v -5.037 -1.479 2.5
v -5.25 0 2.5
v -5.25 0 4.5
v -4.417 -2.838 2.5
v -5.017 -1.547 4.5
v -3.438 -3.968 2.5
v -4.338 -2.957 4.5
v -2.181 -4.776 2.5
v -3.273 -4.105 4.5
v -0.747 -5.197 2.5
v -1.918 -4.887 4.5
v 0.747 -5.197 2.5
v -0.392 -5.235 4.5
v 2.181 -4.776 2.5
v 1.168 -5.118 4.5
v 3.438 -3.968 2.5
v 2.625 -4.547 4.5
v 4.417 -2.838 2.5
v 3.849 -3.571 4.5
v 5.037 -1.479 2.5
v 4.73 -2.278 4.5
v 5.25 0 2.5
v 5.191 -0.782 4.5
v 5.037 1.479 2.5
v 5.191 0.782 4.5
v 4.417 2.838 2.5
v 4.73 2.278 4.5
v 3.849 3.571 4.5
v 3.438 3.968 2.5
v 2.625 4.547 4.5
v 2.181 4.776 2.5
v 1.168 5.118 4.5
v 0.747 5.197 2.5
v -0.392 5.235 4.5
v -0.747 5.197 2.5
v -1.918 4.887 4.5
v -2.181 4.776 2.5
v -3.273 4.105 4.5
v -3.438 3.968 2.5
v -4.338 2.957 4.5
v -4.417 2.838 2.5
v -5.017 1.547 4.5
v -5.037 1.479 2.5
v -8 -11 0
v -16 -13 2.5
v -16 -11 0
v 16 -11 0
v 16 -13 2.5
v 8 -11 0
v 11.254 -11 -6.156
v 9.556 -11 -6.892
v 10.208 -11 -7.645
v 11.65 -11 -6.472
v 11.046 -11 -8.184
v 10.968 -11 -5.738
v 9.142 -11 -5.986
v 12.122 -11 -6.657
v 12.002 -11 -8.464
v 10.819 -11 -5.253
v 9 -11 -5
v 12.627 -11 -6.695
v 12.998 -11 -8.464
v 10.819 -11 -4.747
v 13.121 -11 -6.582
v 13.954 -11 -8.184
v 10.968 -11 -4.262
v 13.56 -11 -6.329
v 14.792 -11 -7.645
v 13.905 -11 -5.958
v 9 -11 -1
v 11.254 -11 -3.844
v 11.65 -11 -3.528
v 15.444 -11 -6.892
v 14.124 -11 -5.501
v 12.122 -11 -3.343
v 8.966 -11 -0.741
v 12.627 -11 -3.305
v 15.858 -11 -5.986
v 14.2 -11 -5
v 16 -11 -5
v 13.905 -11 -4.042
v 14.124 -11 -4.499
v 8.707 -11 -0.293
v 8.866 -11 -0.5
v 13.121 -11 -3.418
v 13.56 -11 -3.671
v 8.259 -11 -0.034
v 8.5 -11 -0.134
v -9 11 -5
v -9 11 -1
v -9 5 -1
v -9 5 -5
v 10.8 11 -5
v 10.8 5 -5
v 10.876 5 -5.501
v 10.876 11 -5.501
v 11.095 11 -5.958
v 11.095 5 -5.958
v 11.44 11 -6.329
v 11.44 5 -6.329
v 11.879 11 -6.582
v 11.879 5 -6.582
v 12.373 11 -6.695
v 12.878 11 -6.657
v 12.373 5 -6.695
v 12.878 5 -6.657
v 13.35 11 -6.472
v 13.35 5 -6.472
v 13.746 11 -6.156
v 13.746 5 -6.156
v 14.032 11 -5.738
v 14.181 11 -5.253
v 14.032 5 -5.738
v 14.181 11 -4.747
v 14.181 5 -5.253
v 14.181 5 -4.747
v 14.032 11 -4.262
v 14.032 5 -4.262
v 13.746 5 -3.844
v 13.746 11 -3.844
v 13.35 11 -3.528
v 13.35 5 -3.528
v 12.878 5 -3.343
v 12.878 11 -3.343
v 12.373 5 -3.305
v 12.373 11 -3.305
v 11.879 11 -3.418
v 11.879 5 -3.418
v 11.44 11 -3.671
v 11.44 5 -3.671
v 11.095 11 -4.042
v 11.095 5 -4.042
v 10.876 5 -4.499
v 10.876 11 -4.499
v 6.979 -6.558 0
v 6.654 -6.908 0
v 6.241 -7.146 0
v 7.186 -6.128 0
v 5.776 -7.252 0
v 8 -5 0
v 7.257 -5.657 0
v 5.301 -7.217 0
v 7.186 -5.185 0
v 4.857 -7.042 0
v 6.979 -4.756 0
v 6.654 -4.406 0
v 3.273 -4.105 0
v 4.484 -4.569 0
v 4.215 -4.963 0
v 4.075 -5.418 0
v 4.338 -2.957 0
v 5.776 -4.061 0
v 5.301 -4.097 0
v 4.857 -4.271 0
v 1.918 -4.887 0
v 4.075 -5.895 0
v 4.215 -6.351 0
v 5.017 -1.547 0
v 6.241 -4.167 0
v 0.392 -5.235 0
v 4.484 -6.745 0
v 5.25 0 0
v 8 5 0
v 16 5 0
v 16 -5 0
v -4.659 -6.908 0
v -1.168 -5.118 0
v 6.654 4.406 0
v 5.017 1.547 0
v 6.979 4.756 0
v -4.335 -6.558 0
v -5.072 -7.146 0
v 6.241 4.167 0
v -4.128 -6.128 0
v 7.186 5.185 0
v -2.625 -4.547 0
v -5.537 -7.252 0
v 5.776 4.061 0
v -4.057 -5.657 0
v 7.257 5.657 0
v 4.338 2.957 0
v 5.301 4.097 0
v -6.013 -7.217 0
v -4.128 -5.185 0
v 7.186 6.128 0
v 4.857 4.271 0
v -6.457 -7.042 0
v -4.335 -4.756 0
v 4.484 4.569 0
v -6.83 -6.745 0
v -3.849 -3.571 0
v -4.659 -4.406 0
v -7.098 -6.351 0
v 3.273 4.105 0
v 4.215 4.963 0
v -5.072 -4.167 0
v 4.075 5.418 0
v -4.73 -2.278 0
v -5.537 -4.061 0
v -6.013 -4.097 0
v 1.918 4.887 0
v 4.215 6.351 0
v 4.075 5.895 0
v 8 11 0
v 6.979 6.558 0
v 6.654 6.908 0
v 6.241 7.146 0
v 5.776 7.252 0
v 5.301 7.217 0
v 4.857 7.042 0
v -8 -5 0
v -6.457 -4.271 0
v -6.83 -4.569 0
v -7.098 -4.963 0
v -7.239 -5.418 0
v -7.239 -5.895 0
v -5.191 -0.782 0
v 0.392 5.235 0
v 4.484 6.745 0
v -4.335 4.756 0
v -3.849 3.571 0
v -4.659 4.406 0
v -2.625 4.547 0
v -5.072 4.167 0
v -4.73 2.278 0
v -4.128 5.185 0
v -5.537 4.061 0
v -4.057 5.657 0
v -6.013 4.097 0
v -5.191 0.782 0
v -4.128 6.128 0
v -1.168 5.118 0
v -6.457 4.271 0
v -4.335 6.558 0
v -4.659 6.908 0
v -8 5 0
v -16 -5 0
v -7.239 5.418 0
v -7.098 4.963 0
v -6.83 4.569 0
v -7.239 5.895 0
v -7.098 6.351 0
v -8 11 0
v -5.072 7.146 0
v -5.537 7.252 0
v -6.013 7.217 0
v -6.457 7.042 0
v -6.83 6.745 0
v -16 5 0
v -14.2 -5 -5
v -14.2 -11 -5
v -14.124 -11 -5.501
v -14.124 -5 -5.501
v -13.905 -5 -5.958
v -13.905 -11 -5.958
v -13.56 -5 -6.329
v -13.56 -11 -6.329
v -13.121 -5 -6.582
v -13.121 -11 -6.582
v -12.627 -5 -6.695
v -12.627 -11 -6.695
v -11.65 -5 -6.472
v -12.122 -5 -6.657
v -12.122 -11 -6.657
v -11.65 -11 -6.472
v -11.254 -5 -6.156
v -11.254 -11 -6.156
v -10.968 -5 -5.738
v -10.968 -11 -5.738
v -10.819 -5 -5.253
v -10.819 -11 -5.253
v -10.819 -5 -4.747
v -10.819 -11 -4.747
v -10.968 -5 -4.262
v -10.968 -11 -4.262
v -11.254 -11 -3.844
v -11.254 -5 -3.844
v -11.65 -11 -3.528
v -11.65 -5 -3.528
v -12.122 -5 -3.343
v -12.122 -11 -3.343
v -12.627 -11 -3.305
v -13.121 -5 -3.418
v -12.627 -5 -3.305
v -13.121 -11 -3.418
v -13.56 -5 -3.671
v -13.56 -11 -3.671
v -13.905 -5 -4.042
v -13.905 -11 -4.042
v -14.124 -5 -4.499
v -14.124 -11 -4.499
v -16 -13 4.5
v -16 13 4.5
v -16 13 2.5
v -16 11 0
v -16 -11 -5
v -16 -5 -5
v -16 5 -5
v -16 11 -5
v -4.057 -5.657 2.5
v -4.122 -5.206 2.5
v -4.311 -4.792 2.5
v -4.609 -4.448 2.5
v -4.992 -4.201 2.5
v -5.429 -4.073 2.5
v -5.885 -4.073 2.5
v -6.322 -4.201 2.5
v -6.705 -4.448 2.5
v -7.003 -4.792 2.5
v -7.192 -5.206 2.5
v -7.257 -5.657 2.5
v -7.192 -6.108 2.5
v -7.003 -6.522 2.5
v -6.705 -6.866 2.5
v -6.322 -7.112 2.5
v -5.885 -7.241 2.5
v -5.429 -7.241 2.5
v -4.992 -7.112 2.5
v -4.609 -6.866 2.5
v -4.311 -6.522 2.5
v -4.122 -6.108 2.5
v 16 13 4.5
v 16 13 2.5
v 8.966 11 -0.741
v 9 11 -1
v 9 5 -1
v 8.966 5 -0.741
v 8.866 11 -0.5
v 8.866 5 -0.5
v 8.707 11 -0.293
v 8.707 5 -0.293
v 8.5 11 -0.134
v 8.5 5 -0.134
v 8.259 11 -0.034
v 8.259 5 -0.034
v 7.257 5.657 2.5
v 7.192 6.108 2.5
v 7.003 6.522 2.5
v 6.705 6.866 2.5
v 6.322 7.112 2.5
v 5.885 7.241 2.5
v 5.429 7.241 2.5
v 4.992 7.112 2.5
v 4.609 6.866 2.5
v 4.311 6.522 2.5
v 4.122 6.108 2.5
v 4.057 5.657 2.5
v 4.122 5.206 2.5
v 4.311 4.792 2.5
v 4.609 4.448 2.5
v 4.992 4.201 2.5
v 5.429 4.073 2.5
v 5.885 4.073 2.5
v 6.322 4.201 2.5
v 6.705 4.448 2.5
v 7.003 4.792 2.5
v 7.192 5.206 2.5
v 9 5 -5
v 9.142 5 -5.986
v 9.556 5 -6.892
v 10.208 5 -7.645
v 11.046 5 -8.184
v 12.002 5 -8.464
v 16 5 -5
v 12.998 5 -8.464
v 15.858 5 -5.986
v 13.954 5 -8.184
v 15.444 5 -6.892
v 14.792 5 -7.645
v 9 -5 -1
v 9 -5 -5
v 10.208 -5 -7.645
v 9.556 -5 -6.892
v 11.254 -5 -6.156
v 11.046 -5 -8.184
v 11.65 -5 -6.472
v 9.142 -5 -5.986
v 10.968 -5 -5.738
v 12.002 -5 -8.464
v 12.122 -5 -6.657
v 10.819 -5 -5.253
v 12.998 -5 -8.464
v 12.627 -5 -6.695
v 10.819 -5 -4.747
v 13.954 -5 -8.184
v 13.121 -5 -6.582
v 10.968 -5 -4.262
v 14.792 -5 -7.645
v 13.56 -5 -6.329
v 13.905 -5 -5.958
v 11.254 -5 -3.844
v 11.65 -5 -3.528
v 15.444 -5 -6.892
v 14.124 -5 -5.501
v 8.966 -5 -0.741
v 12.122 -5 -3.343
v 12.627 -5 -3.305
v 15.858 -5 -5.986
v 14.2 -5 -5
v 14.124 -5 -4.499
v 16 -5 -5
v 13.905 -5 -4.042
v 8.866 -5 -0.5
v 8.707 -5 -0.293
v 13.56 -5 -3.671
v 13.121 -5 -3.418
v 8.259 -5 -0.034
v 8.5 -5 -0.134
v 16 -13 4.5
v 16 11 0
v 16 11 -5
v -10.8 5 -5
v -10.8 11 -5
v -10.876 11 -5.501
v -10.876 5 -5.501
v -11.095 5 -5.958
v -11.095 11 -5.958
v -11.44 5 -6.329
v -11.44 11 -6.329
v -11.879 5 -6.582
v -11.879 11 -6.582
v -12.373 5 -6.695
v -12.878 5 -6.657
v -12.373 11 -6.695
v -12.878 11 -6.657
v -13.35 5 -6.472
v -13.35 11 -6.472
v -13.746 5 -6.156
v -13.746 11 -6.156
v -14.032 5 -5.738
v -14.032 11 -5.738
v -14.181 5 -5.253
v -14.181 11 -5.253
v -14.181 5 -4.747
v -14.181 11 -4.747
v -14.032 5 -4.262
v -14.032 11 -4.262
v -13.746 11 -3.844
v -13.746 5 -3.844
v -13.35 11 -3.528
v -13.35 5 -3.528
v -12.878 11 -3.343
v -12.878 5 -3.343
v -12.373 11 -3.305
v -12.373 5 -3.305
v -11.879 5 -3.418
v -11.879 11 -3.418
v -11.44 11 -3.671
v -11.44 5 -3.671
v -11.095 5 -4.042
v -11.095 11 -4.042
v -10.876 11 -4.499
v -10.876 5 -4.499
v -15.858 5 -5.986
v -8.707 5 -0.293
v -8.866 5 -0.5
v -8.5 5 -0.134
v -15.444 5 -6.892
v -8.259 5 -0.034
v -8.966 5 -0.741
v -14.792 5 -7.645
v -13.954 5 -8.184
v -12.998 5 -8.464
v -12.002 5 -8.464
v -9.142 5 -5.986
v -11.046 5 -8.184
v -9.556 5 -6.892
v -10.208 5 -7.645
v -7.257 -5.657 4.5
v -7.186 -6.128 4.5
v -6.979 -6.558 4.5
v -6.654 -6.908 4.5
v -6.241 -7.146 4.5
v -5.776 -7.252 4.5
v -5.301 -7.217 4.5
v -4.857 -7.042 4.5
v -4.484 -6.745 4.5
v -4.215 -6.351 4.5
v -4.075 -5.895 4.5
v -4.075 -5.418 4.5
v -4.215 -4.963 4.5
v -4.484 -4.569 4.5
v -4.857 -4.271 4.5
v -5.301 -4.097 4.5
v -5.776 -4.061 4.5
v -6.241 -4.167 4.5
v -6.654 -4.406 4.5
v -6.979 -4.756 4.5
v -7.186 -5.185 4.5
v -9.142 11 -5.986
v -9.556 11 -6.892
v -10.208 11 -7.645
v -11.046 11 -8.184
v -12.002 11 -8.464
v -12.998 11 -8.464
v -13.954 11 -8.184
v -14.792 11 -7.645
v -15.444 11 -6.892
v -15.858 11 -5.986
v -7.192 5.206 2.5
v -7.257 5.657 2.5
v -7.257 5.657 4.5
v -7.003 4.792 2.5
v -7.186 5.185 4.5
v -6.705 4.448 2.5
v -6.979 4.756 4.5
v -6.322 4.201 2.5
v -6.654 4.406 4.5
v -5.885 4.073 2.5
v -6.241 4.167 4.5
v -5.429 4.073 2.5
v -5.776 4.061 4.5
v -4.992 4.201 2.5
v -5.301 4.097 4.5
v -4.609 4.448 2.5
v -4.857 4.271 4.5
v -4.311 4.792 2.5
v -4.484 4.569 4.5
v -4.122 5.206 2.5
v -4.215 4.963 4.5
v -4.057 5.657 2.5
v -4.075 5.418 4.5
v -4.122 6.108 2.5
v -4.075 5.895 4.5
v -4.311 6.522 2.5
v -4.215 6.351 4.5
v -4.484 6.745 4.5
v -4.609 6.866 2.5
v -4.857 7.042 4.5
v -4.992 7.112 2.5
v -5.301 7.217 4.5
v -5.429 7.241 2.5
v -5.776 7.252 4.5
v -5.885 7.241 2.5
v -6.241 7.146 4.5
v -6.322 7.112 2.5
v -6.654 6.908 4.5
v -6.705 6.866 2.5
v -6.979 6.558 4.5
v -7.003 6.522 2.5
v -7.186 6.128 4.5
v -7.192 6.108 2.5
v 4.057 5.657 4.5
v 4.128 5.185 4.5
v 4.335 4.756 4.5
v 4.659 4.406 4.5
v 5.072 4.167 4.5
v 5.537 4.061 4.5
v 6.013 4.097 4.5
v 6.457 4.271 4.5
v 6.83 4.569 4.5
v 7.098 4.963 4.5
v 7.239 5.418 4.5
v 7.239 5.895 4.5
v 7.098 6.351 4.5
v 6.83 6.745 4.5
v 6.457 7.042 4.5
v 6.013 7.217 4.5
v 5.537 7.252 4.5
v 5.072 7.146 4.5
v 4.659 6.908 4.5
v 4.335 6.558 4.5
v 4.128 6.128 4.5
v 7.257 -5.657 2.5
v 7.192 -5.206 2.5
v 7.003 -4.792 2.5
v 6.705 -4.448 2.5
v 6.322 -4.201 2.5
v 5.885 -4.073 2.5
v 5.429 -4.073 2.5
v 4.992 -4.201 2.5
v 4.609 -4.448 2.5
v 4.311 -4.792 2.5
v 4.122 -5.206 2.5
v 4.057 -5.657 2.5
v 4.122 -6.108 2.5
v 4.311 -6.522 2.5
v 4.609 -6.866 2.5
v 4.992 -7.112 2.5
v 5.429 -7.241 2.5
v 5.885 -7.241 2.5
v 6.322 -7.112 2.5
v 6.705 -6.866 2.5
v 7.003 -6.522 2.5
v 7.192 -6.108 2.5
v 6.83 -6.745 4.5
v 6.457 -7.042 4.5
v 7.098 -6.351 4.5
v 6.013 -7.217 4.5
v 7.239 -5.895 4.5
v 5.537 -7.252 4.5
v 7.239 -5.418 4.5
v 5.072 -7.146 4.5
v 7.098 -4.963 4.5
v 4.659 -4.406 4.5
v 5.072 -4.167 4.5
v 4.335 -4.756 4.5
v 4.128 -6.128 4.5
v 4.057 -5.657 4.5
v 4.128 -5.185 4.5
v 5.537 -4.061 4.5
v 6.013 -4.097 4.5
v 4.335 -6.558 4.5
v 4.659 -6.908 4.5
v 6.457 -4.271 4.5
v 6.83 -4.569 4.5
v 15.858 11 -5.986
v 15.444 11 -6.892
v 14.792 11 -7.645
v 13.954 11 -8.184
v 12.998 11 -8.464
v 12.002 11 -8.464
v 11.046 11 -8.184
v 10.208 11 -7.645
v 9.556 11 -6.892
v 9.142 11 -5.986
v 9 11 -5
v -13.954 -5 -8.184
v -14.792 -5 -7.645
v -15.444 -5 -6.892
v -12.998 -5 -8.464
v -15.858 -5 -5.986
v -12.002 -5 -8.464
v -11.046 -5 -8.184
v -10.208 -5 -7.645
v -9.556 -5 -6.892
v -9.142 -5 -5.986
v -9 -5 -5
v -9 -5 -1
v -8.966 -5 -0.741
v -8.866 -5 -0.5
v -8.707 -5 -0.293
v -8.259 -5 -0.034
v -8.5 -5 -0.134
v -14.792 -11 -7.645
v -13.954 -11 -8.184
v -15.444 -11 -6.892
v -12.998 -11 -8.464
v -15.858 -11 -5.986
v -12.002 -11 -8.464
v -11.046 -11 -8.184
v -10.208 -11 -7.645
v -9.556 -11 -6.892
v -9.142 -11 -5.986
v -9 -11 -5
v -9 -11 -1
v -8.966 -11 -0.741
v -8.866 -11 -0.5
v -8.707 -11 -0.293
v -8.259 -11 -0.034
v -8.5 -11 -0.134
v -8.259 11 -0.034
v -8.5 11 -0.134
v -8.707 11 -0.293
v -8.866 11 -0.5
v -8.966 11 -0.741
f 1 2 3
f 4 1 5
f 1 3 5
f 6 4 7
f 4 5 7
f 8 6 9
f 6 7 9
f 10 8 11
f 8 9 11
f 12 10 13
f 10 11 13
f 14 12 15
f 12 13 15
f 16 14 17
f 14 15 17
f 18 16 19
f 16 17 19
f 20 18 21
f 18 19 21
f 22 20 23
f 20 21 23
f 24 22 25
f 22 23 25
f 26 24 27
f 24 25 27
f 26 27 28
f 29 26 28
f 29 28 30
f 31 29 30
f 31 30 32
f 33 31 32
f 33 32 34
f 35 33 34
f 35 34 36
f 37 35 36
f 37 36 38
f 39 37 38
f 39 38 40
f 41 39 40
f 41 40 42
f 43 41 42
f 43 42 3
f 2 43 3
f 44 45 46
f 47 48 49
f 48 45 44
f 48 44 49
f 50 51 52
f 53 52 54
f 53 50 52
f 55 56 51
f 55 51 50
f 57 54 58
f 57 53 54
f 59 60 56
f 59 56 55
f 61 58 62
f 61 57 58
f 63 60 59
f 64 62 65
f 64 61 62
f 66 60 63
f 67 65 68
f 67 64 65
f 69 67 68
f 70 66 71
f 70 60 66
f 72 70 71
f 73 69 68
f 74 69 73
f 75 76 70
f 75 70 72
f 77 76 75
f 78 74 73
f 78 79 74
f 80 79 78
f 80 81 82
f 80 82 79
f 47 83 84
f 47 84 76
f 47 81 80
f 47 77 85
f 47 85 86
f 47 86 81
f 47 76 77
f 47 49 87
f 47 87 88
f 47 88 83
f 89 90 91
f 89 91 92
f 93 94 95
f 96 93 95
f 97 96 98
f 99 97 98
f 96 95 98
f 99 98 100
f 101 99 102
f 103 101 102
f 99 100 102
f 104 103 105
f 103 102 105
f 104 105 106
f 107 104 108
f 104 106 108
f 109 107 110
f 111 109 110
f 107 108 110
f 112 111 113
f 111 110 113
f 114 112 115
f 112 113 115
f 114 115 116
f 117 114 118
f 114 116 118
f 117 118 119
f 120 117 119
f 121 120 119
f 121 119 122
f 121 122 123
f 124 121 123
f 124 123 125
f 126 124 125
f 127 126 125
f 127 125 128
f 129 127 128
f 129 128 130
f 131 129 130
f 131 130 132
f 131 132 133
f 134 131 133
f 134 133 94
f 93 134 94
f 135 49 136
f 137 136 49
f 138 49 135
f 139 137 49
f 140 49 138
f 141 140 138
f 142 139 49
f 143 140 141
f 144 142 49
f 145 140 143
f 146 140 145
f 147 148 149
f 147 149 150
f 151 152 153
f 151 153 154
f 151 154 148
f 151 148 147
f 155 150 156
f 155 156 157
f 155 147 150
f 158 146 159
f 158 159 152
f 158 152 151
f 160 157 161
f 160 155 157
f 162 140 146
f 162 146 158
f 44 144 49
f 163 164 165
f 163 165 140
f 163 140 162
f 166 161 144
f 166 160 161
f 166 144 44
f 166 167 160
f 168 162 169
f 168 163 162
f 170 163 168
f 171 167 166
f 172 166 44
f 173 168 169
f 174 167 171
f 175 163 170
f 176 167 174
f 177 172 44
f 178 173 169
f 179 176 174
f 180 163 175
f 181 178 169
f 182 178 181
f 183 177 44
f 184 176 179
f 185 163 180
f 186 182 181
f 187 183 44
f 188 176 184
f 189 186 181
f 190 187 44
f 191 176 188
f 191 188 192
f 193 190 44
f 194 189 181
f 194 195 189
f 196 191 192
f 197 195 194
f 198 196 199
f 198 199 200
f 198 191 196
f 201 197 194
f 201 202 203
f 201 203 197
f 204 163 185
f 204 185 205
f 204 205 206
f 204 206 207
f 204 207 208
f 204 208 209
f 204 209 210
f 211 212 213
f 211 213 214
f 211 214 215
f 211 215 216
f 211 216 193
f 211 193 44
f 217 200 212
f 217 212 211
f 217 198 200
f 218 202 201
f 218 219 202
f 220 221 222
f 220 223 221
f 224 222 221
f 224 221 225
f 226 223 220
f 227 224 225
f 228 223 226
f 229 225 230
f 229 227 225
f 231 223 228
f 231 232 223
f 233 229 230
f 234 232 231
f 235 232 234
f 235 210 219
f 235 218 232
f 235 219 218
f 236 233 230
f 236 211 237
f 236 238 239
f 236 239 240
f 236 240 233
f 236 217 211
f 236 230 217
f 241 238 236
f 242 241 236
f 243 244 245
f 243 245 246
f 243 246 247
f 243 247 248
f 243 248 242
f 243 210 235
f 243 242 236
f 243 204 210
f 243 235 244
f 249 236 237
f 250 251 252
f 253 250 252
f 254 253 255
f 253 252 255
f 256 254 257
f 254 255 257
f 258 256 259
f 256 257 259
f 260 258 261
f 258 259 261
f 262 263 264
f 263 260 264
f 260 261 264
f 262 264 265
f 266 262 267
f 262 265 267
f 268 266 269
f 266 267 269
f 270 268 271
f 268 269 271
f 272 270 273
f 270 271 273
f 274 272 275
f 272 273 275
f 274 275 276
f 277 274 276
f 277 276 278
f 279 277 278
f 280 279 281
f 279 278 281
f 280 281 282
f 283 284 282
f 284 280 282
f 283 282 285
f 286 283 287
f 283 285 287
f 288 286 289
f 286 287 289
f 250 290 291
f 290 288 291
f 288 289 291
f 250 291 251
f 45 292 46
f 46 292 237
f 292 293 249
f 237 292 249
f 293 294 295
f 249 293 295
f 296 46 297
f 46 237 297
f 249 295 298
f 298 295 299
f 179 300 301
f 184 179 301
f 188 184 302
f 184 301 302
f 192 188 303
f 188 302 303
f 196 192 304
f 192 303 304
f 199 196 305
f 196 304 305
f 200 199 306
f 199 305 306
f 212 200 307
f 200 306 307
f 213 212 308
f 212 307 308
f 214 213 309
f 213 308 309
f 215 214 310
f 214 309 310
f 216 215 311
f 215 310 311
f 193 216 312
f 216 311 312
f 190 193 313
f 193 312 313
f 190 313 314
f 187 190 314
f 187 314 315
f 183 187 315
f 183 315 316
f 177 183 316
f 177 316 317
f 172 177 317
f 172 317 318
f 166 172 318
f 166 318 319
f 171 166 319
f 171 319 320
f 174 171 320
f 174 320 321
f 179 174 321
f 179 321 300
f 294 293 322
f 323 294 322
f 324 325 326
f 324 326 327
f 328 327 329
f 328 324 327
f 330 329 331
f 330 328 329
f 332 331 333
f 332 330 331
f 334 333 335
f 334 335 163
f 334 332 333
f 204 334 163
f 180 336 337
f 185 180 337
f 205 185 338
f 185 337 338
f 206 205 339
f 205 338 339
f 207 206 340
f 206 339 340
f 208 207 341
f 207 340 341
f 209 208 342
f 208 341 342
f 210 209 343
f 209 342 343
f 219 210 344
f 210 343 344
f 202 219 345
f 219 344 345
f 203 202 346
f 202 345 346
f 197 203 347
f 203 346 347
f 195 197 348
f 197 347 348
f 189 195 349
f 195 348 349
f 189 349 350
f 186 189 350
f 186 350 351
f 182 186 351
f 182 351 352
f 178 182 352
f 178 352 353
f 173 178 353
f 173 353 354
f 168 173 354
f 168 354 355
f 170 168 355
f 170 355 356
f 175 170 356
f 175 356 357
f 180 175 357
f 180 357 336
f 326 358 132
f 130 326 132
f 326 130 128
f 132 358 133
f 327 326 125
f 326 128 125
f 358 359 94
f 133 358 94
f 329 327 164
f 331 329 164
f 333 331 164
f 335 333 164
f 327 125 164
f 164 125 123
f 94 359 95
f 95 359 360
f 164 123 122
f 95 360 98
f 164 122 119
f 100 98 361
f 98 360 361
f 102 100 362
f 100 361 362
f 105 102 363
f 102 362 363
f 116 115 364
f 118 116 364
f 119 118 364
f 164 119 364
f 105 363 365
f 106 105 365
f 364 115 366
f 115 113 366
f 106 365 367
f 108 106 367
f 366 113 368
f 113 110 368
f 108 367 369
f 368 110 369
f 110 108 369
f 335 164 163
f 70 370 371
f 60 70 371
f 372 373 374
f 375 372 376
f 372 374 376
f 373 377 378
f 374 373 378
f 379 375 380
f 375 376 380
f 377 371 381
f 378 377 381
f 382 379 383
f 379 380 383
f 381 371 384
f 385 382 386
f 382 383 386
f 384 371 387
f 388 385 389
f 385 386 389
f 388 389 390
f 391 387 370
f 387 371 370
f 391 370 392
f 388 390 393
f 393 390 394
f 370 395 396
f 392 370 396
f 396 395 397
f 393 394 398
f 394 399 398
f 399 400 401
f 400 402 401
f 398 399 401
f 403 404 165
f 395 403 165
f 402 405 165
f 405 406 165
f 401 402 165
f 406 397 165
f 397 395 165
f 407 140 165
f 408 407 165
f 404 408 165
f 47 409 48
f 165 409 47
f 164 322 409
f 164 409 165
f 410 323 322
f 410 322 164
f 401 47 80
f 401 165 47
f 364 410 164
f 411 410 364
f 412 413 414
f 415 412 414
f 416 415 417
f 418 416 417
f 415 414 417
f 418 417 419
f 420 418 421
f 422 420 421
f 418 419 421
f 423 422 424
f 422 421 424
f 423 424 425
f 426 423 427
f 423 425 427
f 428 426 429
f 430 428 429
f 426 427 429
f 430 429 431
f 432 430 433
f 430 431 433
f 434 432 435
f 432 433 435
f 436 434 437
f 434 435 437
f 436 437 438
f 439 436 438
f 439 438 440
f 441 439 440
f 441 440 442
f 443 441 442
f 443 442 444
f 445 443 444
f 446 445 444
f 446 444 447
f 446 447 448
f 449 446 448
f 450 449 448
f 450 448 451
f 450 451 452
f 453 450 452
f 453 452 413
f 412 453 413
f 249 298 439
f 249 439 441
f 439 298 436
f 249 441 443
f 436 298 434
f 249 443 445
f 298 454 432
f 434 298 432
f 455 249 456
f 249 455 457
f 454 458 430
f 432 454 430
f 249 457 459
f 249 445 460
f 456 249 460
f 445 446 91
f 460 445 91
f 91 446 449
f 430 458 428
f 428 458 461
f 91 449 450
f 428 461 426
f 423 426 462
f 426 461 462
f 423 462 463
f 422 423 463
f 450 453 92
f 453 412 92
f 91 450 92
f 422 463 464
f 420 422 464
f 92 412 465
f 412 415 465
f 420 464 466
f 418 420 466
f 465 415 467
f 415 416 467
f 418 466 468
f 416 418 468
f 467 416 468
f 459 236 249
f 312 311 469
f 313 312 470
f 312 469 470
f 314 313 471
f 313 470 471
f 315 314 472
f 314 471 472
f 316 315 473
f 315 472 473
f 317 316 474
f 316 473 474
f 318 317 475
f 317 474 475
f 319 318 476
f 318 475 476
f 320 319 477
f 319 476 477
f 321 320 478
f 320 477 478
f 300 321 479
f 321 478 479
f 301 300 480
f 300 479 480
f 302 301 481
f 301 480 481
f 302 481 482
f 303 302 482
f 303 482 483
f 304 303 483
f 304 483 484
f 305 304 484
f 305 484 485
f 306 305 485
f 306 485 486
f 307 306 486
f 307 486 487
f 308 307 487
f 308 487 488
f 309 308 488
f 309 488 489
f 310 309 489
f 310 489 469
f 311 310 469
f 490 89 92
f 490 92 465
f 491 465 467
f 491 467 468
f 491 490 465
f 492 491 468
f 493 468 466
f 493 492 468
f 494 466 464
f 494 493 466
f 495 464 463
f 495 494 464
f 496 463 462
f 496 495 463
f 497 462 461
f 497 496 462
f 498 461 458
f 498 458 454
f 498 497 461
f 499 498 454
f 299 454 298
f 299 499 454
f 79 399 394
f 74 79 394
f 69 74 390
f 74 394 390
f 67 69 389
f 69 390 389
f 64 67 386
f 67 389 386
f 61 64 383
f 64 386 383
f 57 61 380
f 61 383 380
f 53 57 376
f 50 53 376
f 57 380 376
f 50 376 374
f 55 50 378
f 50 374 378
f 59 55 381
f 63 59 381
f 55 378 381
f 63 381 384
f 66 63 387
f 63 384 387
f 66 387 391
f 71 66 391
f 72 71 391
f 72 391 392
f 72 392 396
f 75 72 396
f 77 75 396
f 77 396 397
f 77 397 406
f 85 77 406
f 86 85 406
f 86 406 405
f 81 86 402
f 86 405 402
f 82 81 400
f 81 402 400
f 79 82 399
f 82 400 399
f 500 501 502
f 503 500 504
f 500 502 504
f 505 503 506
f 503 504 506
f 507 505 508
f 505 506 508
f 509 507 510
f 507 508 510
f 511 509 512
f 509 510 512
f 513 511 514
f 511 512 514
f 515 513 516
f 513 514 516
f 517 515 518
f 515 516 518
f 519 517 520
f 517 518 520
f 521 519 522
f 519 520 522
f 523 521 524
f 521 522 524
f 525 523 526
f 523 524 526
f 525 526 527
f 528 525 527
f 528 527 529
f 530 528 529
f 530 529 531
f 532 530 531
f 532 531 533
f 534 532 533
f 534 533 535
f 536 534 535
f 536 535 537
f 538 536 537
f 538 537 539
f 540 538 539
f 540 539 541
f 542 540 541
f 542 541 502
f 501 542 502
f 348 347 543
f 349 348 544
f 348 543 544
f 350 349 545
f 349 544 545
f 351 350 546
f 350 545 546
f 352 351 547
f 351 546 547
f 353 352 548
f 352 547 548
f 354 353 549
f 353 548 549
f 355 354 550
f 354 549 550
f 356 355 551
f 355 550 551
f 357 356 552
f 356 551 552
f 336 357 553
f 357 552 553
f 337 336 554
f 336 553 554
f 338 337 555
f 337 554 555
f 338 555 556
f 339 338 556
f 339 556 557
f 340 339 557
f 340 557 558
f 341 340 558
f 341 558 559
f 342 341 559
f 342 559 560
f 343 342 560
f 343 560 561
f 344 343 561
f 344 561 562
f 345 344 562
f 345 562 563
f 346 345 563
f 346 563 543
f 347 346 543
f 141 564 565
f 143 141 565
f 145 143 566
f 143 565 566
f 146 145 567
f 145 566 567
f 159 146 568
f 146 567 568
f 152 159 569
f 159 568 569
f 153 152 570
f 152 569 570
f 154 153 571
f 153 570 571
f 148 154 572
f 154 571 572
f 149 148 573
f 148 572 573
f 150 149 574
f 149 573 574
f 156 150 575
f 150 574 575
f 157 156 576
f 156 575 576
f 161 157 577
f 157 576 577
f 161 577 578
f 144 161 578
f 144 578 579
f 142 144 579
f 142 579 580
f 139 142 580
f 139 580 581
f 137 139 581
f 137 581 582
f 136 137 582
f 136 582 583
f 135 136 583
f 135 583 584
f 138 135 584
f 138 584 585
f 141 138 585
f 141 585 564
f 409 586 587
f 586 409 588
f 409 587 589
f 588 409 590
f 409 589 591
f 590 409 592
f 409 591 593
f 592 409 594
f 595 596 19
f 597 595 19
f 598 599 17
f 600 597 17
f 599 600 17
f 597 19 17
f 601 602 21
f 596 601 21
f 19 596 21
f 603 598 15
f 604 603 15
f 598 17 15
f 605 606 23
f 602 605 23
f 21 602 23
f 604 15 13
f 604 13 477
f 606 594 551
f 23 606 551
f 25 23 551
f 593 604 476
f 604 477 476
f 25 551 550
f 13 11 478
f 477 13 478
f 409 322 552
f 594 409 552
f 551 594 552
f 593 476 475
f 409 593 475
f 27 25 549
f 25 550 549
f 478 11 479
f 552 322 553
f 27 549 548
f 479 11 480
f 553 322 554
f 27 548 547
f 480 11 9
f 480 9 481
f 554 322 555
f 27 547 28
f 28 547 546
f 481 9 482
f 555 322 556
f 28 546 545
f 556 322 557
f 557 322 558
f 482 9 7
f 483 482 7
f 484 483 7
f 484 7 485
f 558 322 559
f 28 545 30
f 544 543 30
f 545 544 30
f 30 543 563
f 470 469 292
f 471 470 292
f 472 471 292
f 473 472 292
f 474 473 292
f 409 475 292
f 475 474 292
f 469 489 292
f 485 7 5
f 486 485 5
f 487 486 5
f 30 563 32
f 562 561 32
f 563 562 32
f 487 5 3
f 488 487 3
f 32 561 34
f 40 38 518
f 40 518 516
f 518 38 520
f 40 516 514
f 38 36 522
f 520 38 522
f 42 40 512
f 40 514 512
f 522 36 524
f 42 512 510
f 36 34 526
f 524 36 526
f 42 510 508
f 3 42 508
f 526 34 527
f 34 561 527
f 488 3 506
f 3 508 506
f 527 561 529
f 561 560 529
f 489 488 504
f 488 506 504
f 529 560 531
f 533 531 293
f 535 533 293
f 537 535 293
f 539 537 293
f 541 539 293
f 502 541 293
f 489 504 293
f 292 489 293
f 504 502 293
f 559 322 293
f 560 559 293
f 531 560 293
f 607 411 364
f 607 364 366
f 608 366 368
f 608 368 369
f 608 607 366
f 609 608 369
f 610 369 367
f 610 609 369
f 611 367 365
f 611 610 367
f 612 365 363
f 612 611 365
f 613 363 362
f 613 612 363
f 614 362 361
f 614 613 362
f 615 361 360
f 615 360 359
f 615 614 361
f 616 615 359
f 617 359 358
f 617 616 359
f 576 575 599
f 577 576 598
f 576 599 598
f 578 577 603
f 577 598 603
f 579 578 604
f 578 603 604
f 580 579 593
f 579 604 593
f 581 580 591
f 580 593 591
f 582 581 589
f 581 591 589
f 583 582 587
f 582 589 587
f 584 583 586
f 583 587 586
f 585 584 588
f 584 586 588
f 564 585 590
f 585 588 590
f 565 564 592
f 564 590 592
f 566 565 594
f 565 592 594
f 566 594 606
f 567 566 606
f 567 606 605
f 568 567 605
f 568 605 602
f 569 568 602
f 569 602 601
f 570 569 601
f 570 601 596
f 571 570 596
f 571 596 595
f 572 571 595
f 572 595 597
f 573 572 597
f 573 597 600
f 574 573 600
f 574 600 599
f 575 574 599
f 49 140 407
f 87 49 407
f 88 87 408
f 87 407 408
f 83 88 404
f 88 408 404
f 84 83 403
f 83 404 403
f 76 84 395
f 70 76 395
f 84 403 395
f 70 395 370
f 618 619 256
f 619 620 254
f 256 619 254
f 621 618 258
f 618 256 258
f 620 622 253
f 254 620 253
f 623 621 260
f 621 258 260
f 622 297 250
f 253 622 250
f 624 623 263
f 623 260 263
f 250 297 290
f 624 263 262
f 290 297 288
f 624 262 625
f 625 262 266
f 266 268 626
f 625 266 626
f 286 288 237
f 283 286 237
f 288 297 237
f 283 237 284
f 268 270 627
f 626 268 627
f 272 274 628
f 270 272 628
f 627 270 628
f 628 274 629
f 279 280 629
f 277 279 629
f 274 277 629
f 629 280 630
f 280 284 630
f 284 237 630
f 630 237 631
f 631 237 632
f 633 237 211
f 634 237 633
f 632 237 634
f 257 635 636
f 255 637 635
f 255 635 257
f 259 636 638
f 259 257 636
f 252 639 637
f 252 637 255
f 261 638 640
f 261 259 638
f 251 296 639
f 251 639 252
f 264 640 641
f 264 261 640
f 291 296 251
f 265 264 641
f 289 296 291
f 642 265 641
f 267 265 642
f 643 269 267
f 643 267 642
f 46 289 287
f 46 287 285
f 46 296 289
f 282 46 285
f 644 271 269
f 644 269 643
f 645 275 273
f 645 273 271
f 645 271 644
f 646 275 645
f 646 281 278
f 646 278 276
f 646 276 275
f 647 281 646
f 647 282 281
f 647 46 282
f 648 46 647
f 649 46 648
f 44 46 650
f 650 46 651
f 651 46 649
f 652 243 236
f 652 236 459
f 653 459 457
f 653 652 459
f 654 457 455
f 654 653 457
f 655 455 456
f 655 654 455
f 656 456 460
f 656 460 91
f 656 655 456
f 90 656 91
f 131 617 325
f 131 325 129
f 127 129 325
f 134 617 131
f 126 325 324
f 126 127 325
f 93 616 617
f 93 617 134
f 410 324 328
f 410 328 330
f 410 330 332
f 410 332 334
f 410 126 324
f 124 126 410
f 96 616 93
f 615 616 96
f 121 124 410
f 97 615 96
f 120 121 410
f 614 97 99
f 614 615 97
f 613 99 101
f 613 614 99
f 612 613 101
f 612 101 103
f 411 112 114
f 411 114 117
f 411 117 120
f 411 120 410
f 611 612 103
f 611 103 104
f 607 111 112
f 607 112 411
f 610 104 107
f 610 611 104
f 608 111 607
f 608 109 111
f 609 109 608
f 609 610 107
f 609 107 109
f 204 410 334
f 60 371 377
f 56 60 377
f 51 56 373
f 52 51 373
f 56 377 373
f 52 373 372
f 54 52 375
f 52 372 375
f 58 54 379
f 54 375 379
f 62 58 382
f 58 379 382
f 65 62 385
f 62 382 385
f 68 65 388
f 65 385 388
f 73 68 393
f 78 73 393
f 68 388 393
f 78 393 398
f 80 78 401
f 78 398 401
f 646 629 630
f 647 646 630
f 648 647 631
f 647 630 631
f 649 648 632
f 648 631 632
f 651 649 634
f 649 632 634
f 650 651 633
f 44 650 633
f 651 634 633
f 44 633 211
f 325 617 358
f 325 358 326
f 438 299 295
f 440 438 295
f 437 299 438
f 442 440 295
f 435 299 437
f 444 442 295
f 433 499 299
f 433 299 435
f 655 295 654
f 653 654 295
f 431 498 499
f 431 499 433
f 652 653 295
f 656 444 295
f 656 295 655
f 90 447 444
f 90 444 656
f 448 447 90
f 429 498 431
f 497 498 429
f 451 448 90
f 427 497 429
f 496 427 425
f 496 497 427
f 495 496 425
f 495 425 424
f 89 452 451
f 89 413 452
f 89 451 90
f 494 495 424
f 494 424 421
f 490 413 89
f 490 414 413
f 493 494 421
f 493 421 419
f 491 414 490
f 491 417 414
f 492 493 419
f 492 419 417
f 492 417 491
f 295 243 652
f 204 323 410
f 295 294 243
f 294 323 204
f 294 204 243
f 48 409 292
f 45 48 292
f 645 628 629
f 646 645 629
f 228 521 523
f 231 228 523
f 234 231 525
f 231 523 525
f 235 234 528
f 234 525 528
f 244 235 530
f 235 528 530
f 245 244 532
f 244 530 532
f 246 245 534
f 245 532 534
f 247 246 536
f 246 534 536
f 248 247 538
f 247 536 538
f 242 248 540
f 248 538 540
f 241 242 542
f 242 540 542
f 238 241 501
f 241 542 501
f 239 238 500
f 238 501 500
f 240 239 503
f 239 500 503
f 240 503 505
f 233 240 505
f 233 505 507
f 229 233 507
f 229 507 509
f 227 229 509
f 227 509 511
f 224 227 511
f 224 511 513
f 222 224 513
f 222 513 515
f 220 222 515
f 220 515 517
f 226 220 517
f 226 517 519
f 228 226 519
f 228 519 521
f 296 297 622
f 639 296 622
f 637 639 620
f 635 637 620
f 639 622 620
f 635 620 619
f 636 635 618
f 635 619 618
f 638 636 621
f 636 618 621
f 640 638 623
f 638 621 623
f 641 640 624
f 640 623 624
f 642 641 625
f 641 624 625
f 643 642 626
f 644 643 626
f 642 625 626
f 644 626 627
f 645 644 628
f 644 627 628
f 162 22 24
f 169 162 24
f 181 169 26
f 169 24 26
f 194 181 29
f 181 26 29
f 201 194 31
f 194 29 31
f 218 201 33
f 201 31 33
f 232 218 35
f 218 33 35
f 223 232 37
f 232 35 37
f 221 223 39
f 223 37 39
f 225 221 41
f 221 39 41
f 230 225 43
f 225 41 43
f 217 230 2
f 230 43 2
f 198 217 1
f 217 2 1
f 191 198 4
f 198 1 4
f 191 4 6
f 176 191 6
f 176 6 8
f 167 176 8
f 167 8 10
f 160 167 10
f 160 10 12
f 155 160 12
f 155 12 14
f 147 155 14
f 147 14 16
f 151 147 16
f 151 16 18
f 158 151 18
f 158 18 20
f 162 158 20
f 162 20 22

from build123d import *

# Parameters (mm, degrees)
SKETCH_1_W                  = 32
SKETCH_1_H                  = 22
EXTRUDE_1_DEPTH             = 2.5
EXTRUDE_2_DEPTH             = 6
EXTRUDE_3_DEPTH             = 6
EXTRUDE_START               = -6
EXTRUDE_4_DEPTH             = 6
EXTRUDE_5_DEPTH             = 6
HOLE_WIZARD_3_4_3_4_1_D     = 3.4
HOLE_WIZARD_3_4_3_4_1_DEPTH = 6
HOLE_WIZARD_3_4_3_4_2_D     = 3.4
HOLE_WIZARD_3_4_3_4_2_DEPTH = 6
HOLE_WIZARD_3_4_3_4_3_D     = 3.4
HOLE_WIZARD_3_4_3_4_4_D     = 3.4
HOLE_WIZARD_3_4_3_4_4_DEPTH = 22
HOLE_WIZARD_3_2_3_2_1_D     = 3.2
HOLE_WIZARD_10_5_10_5_1_D   = 10.5
EXTRUDE_START_2             = 2
SKETCH_18_R                 = 1.6
SKETCH_18_R_2               = 5.25
EXTRUDE_7_DEPTH             = 2
RIB_1_REACH                 = 43.485
SKETCH_20_WALL_W            = 88.17143617
SKETCH_20_WALL_H            = 32
RIB_2_REACH                 = 43.485
SKETCH_22_WALL_W            = 88.17143617
SKETCH_22_WALL_H            = 32


with BuildPart() as part:
    # 草图1 → 凸台-拉伸1 (new body)
    with BuildSketch(Plane(origin=(0, 0, 0), x_dir=(-1, 0, 0), z_dir=(0, 0, -1))):
        Rectangle(SKETCH_1_W, SKETCH_1_H)
    extrude(amount=-EXTRUDE_1_DEPTH)

    # 草图2 → 凸台-拉伸2 (add)
    with BuildSketch(Plane(origin=(0, 11, 0), x_dir=(1, 0, 0), z_dir=(0, 1, 0))):
        with BuildLine():
            Line((9, 5), (9, 1))
            ThreePointArc((9, 1), (8.707106781, 0.292893219), (8, 0))
            Line((8, 0), (16, 0))
            Line((16, 0), (16, 5))
            ThreePointArc((16, 5), (12.5, 8.5), (9, 5))
        make_face()
    extrude(amount=-EXTRUDE_2_DEPTH)

    # 草图3 → 凸台-拉伸3 (add)
    with BuildSketch(Plane(origin=(0, 11, 0), x_dir=(1, 0, 0), z_dir=(0, 1, 0))):
        with BuildLine():
            Line((-16, 0), (-8, 0))
            ThreePointArc((-8, 0), (-8.707106781, 0.292893219), (-9, 1))
            Line((-9, 1), (-9, 5))
            ThreePointArc((-9, 5), (-12.5, 8.5), (-16, 5))
            Line((-16, 5), (-16, 0))
        make_face()
    extrude(amount=-EXTRUDE_3_DEPTH)

    # 草图4 → 凸台-拉伸4 (add)
    with BuildSketch(Plane.XZ.offset(11).offset(EXTRUDE_START)):
        with BuildLine():
            Line((-8, 0), (-16, 0))
            Line((-16, 0), (-16, -5))
            ThreePointArc((-16, -5), (-12.5, -8.5), (-9, -5))
            Line((-9, -5), (-9, -1))
            ThreePointArc((-9, -1), (-8.707106781, -0.292893219), (-8, 0))
        make_face()
    extrude(amount=EXTRUDE_4_DEPTH)

    # 草图5 → 凸台-拉伸5 (add)
    with BuildSketch(Plane.XZ.offset(11).offset(EXTRUDE_START)):
        with BuildLine():
            Line((16, -5), (16, 0))
            Line((16, 0), (8, 0))
            ThreePointArc((8, 0), (8.707106781, -0.292893219), (9, -1))
            Line((9, -1), (9, -5))
            ThreePointArc((9, -5), (12.5, -8.5), (16, -5))
        make_face()
    extrude(amount=EXTRUDE_5_DEPTH)

    # Ø3.4 (3.4) 直径孔1
    with Locations(Plane(origin=(0, -5, 0), x_dir=(1, 0, 0), z_dir=(0, 1, 0))):
        with Locations((-12.5, 5)):
            Hole(HOLE_WIZARD_3_4_3_4_1_D / 2, depth=HOLE_WIZARD_3_4_3_4_1_DEPTH)

    # Ø3.4 (3.4) 直径孔2
    with Locations(Plane(origin=(0, -11, 0), x_dir=(-1, 0, 0), z_dir=(0, -1, 0))):
        with Locations((-12.5, 5)):
            Hole(HOLE_WIZARD_3_4_3_4_2_D / 2, depth=HOLE_WIZARD_3_4_3_4_2_DEPTH)

    # Ø3.4 (3.4) 直径孔3 (through all)
    with Locations(Plane(origin=(0, 5, 0), x_dir=(-1, 0, 0), z_dir=(0, -1, 0))):
        with Locations((12.5, 5)):
            Hole(HOLE_WIZARD_3_4_3_4_3_D / 2)

    # Ø3.4 (3.4) 直径孔4
    with Locations(Plane(origin=(0, 11, 0), x_dir=(1, 0, 0), z_dir=(0, 1, 0))):
        with Locations((12.5, 5)):
            Hole(HOLE_WIZARD_3_4_3_4_4_D / 2, depth=HOLE_WIZARD_3_4_3_4_4_DEPTH)

    # Ø3.2 (3.2) 直径孔1 (through all)
    with Locations(Plane(origin=(0, 0, 0), x_dir=(-1, 0, 0), z_dir=(0, 0, -1))):
        with Locations((5.656854249, 5.656854249), (-5.656854249, 5.656854249), (-5.656854249, -5.656854249), (5.656854249, -5.656854249)):
            Hole(HOLE_WIZARD_3_2_3_2_1_D / 2)

    # Ø10.5 (10.5) 直径孔1 (through all)
    with Locations(Plane(origin=(0, 0, 0), x_dir=(-1, 0, 0), z_dir=(0, 0, -1))):
        with Locations((0, 0)):
            Hole(HOLE_WIZARD_10_5_10_5_1_D / 2)

    # 草图18 → 凸台-拉伸7 (add)
    with BuildSketch(Plane.XY.offset(2.5).offset(EXTRUDE_START_2)):
        Polygon((-16, 11), (-16, 13), (16, 13), (16, 11), (16, -11), (16, -13), (-16, -13), (-16, -11), align=None)
        with Locations(Location((-5.656854249, 5.656854249, 0), (0, 0, 180))):
            Circle(SKETCH_18_R, mode=Mode.SUBTRACT)
        with Locations(Location((5.656854249, 5.656854249, 0), (0, 0, 180))):
            Circle(SKETCH_18_R, mode=Mode.SUBTRACT)
        with Locations(Location((5.656854249, -5.656854249, 0), (0, 0, 180))):
            Circle(SKETCH_18_R, mode=Mode.SUBTRACT)
        with Locations(Location((-5.656854249, -5.656854249, 0), (0, 0, 180))):
            Circle(SKETCH_18_R, mode=Mode.SUBTRACT)
        with Locations(Location((0, 0, 0), (0, 0, 180))):
            Circle(SKETCH_18_R_2, mode=Mode.SUBTRACT)
    extrude(amount=-EXTRUDE_7_DEPTH)

    # 草图20 wall → 筋1 (add, up to next)
    with BuildSketch(Plane(origin=(-16, -12, 1.25), x_dir=(0, 0.624695047554, -0.780868809443), z_dir=(0, -0.780868809443, -0.624695047554)), mode=Mode.PRIVATE) as rib_1_sk1:
        with Locations((0, 16)):
            Rectangle(SKETCH_20_WALL_W, SKETCH_20_WALL_H)
    rib_1_tool1 = extrude(rib_1_sk1.sketch, amount=-RIB_1_REACH, mode=Mode.PRIVATE) - part.part
    add(rib_1_tool1.solids().sort_by_distance((-16, -12, 1.25))[0])

    # 草图22 wall → 筋2 (add, up to next)
    with BuildSketch(Plane(origin=(16, 12, 1.25), x_dir=(0, -0.624695047554, -0.780868809443), z_dir=(0, 0.780868809443, -0.624695047554)), mode=Mode.PRIVATE) as rib_2_sk1:
        with Locations((0, 16)):
            Rectangle(SKETCH_22_WALL_W, SKETCH_22_WALL_H)
    rib_2_tool1 = extrude(rib_2_sk1.sketch, amount=-RIB_2_REACH, mode=Mode.PRIVATE) - part.part
    add(rib_2_tool1.solids().sort_by_distance((16, 12, 1.25))[0])


solid = part.part
